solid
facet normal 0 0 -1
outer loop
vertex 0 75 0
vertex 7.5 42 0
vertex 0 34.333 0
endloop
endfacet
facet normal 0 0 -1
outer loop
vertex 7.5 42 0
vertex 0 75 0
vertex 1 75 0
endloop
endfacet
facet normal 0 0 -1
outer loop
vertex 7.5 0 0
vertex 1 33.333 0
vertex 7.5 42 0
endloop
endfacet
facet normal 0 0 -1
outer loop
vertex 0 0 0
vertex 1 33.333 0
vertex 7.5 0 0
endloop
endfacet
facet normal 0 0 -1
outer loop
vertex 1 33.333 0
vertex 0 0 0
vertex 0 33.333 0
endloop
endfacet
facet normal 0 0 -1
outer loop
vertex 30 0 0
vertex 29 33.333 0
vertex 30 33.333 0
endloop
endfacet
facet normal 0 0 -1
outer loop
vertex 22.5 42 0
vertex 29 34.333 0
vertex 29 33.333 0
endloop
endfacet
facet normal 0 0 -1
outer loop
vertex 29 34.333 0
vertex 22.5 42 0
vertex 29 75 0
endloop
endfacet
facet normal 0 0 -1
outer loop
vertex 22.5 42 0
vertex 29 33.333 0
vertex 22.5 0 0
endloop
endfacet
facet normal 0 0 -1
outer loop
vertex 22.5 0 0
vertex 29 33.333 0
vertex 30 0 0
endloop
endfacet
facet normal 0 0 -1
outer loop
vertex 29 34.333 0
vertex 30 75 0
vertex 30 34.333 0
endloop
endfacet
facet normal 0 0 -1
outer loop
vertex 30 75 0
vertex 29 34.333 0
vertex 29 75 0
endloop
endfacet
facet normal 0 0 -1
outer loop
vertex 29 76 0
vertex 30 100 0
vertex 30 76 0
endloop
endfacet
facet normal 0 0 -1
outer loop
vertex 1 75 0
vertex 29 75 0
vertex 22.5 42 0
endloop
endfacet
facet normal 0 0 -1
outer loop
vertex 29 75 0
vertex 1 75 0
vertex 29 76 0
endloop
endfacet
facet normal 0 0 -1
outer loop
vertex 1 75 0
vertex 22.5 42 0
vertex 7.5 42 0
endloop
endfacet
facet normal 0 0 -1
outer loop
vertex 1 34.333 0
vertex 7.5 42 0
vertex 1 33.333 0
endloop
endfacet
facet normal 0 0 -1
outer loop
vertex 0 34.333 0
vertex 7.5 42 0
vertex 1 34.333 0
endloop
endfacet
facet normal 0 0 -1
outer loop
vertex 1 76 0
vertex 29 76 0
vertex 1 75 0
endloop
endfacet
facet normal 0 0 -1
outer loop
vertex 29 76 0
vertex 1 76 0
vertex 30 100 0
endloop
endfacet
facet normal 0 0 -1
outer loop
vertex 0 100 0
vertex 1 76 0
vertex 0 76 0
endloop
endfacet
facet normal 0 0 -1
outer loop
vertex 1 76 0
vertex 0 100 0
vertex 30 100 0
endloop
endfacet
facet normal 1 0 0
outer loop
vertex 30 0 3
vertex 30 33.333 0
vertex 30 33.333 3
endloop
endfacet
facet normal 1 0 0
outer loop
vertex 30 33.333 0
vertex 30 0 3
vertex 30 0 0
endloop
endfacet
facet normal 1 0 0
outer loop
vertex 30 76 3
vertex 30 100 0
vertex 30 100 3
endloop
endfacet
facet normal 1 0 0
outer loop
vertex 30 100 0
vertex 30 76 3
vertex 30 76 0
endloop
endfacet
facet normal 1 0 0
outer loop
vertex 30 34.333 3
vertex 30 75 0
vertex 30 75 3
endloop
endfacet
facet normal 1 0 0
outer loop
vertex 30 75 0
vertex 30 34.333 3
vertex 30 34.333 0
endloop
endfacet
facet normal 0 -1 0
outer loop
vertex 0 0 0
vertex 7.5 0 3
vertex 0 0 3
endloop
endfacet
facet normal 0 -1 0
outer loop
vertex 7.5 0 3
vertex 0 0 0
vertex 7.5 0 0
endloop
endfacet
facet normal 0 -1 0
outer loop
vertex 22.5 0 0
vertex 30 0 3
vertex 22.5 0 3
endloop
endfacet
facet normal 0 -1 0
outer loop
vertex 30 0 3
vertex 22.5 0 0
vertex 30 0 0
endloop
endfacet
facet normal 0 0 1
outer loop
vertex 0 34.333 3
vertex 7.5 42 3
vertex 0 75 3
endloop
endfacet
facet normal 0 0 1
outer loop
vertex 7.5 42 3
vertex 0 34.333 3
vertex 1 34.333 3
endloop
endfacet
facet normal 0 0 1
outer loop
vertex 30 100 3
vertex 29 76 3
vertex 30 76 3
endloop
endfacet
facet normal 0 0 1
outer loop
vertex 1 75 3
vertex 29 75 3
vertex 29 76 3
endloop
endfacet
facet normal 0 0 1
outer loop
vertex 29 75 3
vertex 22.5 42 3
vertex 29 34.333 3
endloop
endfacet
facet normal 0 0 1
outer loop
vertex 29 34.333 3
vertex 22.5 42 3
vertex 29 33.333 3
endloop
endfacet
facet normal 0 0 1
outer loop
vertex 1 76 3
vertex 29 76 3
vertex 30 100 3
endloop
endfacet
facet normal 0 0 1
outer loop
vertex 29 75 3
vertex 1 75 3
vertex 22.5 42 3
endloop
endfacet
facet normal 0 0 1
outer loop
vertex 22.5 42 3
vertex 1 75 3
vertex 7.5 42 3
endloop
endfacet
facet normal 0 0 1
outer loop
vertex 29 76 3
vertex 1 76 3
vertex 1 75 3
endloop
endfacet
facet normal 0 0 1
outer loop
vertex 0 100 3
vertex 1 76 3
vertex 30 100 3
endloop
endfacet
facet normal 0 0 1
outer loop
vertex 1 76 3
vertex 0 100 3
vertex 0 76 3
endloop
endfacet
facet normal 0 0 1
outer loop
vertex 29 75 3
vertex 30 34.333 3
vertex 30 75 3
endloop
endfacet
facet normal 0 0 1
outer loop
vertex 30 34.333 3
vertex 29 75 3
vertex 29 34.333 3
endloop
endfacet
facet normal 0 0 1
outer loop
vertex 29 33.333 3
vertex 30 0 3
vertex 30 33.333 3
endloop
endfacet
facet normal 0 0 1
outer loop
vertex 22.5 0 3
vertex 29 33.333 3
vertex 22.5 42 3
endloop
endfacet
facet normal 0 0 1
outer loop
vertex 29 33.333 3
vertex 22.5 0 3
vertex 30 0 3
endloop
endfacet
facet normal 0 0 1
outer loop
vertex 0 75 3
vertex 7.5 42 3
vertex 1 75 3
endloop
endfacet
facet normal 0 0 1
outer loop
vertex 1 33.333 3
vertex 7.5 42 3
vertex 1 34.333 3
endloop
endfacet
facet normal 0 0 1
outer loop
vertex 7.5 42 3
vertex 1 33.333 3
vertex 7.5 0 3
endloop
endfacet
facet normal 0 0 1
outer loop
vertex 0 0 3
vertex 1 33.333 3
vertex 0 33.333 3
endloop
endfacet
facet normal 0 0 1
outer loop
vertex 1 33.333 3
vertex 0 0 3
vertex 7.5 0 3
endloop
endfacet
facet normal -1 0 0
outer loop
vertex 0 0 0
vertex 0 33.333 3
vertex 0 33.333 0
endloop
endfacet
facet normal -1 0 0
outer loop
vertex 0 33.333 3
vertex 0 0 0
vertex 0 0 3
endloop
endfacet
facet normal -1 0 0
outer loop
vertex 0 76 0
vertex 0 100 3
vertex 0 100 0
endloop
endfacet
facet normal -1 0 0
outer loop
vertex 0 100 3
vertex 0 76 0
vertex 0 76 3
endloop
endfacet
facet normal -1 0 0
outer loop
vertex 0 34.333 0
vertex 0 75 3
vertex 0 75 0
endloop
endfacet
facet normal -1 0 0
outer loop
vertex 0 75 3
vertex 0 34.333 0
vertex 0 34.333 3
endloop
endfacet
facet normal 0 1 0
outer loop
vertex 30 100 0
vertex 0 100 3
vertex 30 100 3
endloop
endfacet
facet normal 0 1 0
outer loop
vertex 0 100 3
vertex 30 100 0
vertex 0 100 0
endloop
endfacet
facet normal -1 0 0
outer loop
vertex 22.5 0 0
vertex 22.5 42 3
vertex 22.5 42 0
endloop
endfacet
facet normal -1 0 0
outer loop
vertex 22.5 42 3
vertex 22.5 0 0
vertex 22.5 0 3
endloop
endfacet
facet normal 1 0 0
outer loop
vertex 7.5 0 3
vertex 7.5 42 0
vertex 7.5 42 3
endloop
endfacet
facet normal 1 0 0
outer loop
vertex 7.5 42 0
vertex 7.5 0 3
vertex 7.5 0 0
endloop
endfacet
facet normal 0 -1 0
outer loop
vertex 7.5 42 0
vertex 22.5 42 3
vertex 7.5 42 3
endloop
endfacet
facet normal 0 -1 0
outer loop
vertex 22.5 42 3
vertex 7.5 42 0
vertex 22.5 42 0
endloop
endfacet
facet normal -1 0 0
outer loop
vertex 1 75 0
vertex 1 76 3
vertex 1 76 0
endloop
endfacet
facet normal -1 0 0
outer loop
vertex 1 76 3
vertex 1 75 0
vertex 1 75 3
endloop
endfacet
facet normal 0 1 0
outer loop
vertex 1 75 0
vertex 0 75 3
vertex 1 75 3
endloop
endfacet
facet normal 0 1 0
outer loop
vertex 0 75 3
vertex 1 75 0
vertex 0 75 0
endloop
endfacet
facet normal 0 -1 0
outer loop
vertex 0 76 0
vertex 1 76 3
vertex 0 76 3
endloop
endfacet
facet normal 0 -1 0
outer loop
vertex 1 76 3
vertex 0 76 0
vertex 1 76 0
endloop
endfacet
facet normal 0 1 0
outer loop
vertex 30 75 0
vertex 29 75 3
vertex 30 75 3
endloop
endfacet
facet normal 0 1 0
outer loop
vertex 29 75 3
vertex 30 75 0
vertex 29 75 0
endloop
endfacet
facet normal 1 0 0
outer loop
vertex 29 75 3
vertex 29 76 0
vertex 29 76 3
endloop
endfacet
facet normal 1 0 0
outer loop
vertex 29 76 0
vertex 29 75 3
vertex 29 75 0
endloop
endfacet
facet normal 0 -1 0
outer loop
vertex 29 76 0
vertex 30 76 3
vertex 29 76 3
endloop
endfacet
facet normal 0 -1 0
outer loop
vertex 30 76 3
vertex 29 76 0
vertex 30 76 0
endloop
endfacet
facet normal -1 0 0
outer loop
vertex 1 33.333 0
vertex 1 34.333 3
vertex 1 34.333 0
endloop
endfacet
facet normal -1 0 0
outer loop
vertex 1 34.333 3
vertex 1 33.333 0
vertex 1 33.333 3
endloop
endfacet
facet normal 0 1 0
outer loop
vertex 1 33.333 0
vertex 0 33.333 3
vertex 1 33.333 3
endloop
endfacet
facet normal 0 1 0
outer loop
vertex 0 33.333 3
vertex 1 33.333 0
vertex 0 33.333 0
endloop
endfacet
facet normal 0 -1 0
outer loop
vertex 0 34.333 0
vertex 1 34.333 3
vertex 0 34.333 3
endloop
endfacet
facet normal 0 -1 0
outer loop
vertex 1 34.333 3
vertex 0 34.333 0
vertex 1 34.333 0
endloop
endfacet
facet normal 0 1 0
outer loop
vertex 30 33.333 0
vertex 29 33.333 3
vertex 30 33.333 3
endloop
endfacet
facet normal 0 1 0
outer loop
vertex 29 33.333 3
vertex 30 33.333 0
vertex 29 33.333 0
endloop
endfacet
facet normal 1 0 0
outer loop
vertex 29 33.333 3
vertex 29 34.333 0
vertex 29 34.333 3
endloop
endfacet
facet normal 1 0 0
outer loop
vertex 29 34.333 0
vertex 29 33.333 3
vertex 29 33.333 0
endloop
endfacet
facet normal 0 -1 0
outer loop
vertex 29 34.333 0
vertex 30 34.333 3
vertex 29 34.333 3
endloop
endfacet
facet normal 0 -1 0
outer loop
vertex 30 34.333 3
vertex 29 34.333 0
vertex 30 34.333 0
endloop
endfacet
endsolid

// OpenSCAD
height = 3;
width = 30;
length = 100;

base = [
    [0, 0],
    [0, length],
    [width, length],
    [width, 0]
];

delta_length = 42;
delta_base = [
    [0, 0],
    [0, delta_length],
    [width / 2, delta_length],
    [width / 2, 0]
];

notch = [
    [0, 0], [0, 1], [1, 1], [1, 0]
];


difference() {
    linear_extrude(height = height) {
        polygon(base);
    }
    
    translate([width / 4,0,0])
        linear_extrude(height = height) {
            polygon(delta_base);
        }
        
    // notch for the sensor
    translate([0, length / 4 * 3, 0])
        linear_extrude(height = height) {
            polygon(notch);
        } 
    translate([width - 1, length / 4 * 3, 0])
        linear_extrude(height = height) {
            polygon(notch);
        }
        
    // notch for the board
    translate([0, length / 3, 0])
        linear_extrude(height = height) {
            polygon(notch);
        } 
    translate([width - 1, length / 3, 0])
        linear_extrude(height = height) {
            polygon(notch);
        }
}
